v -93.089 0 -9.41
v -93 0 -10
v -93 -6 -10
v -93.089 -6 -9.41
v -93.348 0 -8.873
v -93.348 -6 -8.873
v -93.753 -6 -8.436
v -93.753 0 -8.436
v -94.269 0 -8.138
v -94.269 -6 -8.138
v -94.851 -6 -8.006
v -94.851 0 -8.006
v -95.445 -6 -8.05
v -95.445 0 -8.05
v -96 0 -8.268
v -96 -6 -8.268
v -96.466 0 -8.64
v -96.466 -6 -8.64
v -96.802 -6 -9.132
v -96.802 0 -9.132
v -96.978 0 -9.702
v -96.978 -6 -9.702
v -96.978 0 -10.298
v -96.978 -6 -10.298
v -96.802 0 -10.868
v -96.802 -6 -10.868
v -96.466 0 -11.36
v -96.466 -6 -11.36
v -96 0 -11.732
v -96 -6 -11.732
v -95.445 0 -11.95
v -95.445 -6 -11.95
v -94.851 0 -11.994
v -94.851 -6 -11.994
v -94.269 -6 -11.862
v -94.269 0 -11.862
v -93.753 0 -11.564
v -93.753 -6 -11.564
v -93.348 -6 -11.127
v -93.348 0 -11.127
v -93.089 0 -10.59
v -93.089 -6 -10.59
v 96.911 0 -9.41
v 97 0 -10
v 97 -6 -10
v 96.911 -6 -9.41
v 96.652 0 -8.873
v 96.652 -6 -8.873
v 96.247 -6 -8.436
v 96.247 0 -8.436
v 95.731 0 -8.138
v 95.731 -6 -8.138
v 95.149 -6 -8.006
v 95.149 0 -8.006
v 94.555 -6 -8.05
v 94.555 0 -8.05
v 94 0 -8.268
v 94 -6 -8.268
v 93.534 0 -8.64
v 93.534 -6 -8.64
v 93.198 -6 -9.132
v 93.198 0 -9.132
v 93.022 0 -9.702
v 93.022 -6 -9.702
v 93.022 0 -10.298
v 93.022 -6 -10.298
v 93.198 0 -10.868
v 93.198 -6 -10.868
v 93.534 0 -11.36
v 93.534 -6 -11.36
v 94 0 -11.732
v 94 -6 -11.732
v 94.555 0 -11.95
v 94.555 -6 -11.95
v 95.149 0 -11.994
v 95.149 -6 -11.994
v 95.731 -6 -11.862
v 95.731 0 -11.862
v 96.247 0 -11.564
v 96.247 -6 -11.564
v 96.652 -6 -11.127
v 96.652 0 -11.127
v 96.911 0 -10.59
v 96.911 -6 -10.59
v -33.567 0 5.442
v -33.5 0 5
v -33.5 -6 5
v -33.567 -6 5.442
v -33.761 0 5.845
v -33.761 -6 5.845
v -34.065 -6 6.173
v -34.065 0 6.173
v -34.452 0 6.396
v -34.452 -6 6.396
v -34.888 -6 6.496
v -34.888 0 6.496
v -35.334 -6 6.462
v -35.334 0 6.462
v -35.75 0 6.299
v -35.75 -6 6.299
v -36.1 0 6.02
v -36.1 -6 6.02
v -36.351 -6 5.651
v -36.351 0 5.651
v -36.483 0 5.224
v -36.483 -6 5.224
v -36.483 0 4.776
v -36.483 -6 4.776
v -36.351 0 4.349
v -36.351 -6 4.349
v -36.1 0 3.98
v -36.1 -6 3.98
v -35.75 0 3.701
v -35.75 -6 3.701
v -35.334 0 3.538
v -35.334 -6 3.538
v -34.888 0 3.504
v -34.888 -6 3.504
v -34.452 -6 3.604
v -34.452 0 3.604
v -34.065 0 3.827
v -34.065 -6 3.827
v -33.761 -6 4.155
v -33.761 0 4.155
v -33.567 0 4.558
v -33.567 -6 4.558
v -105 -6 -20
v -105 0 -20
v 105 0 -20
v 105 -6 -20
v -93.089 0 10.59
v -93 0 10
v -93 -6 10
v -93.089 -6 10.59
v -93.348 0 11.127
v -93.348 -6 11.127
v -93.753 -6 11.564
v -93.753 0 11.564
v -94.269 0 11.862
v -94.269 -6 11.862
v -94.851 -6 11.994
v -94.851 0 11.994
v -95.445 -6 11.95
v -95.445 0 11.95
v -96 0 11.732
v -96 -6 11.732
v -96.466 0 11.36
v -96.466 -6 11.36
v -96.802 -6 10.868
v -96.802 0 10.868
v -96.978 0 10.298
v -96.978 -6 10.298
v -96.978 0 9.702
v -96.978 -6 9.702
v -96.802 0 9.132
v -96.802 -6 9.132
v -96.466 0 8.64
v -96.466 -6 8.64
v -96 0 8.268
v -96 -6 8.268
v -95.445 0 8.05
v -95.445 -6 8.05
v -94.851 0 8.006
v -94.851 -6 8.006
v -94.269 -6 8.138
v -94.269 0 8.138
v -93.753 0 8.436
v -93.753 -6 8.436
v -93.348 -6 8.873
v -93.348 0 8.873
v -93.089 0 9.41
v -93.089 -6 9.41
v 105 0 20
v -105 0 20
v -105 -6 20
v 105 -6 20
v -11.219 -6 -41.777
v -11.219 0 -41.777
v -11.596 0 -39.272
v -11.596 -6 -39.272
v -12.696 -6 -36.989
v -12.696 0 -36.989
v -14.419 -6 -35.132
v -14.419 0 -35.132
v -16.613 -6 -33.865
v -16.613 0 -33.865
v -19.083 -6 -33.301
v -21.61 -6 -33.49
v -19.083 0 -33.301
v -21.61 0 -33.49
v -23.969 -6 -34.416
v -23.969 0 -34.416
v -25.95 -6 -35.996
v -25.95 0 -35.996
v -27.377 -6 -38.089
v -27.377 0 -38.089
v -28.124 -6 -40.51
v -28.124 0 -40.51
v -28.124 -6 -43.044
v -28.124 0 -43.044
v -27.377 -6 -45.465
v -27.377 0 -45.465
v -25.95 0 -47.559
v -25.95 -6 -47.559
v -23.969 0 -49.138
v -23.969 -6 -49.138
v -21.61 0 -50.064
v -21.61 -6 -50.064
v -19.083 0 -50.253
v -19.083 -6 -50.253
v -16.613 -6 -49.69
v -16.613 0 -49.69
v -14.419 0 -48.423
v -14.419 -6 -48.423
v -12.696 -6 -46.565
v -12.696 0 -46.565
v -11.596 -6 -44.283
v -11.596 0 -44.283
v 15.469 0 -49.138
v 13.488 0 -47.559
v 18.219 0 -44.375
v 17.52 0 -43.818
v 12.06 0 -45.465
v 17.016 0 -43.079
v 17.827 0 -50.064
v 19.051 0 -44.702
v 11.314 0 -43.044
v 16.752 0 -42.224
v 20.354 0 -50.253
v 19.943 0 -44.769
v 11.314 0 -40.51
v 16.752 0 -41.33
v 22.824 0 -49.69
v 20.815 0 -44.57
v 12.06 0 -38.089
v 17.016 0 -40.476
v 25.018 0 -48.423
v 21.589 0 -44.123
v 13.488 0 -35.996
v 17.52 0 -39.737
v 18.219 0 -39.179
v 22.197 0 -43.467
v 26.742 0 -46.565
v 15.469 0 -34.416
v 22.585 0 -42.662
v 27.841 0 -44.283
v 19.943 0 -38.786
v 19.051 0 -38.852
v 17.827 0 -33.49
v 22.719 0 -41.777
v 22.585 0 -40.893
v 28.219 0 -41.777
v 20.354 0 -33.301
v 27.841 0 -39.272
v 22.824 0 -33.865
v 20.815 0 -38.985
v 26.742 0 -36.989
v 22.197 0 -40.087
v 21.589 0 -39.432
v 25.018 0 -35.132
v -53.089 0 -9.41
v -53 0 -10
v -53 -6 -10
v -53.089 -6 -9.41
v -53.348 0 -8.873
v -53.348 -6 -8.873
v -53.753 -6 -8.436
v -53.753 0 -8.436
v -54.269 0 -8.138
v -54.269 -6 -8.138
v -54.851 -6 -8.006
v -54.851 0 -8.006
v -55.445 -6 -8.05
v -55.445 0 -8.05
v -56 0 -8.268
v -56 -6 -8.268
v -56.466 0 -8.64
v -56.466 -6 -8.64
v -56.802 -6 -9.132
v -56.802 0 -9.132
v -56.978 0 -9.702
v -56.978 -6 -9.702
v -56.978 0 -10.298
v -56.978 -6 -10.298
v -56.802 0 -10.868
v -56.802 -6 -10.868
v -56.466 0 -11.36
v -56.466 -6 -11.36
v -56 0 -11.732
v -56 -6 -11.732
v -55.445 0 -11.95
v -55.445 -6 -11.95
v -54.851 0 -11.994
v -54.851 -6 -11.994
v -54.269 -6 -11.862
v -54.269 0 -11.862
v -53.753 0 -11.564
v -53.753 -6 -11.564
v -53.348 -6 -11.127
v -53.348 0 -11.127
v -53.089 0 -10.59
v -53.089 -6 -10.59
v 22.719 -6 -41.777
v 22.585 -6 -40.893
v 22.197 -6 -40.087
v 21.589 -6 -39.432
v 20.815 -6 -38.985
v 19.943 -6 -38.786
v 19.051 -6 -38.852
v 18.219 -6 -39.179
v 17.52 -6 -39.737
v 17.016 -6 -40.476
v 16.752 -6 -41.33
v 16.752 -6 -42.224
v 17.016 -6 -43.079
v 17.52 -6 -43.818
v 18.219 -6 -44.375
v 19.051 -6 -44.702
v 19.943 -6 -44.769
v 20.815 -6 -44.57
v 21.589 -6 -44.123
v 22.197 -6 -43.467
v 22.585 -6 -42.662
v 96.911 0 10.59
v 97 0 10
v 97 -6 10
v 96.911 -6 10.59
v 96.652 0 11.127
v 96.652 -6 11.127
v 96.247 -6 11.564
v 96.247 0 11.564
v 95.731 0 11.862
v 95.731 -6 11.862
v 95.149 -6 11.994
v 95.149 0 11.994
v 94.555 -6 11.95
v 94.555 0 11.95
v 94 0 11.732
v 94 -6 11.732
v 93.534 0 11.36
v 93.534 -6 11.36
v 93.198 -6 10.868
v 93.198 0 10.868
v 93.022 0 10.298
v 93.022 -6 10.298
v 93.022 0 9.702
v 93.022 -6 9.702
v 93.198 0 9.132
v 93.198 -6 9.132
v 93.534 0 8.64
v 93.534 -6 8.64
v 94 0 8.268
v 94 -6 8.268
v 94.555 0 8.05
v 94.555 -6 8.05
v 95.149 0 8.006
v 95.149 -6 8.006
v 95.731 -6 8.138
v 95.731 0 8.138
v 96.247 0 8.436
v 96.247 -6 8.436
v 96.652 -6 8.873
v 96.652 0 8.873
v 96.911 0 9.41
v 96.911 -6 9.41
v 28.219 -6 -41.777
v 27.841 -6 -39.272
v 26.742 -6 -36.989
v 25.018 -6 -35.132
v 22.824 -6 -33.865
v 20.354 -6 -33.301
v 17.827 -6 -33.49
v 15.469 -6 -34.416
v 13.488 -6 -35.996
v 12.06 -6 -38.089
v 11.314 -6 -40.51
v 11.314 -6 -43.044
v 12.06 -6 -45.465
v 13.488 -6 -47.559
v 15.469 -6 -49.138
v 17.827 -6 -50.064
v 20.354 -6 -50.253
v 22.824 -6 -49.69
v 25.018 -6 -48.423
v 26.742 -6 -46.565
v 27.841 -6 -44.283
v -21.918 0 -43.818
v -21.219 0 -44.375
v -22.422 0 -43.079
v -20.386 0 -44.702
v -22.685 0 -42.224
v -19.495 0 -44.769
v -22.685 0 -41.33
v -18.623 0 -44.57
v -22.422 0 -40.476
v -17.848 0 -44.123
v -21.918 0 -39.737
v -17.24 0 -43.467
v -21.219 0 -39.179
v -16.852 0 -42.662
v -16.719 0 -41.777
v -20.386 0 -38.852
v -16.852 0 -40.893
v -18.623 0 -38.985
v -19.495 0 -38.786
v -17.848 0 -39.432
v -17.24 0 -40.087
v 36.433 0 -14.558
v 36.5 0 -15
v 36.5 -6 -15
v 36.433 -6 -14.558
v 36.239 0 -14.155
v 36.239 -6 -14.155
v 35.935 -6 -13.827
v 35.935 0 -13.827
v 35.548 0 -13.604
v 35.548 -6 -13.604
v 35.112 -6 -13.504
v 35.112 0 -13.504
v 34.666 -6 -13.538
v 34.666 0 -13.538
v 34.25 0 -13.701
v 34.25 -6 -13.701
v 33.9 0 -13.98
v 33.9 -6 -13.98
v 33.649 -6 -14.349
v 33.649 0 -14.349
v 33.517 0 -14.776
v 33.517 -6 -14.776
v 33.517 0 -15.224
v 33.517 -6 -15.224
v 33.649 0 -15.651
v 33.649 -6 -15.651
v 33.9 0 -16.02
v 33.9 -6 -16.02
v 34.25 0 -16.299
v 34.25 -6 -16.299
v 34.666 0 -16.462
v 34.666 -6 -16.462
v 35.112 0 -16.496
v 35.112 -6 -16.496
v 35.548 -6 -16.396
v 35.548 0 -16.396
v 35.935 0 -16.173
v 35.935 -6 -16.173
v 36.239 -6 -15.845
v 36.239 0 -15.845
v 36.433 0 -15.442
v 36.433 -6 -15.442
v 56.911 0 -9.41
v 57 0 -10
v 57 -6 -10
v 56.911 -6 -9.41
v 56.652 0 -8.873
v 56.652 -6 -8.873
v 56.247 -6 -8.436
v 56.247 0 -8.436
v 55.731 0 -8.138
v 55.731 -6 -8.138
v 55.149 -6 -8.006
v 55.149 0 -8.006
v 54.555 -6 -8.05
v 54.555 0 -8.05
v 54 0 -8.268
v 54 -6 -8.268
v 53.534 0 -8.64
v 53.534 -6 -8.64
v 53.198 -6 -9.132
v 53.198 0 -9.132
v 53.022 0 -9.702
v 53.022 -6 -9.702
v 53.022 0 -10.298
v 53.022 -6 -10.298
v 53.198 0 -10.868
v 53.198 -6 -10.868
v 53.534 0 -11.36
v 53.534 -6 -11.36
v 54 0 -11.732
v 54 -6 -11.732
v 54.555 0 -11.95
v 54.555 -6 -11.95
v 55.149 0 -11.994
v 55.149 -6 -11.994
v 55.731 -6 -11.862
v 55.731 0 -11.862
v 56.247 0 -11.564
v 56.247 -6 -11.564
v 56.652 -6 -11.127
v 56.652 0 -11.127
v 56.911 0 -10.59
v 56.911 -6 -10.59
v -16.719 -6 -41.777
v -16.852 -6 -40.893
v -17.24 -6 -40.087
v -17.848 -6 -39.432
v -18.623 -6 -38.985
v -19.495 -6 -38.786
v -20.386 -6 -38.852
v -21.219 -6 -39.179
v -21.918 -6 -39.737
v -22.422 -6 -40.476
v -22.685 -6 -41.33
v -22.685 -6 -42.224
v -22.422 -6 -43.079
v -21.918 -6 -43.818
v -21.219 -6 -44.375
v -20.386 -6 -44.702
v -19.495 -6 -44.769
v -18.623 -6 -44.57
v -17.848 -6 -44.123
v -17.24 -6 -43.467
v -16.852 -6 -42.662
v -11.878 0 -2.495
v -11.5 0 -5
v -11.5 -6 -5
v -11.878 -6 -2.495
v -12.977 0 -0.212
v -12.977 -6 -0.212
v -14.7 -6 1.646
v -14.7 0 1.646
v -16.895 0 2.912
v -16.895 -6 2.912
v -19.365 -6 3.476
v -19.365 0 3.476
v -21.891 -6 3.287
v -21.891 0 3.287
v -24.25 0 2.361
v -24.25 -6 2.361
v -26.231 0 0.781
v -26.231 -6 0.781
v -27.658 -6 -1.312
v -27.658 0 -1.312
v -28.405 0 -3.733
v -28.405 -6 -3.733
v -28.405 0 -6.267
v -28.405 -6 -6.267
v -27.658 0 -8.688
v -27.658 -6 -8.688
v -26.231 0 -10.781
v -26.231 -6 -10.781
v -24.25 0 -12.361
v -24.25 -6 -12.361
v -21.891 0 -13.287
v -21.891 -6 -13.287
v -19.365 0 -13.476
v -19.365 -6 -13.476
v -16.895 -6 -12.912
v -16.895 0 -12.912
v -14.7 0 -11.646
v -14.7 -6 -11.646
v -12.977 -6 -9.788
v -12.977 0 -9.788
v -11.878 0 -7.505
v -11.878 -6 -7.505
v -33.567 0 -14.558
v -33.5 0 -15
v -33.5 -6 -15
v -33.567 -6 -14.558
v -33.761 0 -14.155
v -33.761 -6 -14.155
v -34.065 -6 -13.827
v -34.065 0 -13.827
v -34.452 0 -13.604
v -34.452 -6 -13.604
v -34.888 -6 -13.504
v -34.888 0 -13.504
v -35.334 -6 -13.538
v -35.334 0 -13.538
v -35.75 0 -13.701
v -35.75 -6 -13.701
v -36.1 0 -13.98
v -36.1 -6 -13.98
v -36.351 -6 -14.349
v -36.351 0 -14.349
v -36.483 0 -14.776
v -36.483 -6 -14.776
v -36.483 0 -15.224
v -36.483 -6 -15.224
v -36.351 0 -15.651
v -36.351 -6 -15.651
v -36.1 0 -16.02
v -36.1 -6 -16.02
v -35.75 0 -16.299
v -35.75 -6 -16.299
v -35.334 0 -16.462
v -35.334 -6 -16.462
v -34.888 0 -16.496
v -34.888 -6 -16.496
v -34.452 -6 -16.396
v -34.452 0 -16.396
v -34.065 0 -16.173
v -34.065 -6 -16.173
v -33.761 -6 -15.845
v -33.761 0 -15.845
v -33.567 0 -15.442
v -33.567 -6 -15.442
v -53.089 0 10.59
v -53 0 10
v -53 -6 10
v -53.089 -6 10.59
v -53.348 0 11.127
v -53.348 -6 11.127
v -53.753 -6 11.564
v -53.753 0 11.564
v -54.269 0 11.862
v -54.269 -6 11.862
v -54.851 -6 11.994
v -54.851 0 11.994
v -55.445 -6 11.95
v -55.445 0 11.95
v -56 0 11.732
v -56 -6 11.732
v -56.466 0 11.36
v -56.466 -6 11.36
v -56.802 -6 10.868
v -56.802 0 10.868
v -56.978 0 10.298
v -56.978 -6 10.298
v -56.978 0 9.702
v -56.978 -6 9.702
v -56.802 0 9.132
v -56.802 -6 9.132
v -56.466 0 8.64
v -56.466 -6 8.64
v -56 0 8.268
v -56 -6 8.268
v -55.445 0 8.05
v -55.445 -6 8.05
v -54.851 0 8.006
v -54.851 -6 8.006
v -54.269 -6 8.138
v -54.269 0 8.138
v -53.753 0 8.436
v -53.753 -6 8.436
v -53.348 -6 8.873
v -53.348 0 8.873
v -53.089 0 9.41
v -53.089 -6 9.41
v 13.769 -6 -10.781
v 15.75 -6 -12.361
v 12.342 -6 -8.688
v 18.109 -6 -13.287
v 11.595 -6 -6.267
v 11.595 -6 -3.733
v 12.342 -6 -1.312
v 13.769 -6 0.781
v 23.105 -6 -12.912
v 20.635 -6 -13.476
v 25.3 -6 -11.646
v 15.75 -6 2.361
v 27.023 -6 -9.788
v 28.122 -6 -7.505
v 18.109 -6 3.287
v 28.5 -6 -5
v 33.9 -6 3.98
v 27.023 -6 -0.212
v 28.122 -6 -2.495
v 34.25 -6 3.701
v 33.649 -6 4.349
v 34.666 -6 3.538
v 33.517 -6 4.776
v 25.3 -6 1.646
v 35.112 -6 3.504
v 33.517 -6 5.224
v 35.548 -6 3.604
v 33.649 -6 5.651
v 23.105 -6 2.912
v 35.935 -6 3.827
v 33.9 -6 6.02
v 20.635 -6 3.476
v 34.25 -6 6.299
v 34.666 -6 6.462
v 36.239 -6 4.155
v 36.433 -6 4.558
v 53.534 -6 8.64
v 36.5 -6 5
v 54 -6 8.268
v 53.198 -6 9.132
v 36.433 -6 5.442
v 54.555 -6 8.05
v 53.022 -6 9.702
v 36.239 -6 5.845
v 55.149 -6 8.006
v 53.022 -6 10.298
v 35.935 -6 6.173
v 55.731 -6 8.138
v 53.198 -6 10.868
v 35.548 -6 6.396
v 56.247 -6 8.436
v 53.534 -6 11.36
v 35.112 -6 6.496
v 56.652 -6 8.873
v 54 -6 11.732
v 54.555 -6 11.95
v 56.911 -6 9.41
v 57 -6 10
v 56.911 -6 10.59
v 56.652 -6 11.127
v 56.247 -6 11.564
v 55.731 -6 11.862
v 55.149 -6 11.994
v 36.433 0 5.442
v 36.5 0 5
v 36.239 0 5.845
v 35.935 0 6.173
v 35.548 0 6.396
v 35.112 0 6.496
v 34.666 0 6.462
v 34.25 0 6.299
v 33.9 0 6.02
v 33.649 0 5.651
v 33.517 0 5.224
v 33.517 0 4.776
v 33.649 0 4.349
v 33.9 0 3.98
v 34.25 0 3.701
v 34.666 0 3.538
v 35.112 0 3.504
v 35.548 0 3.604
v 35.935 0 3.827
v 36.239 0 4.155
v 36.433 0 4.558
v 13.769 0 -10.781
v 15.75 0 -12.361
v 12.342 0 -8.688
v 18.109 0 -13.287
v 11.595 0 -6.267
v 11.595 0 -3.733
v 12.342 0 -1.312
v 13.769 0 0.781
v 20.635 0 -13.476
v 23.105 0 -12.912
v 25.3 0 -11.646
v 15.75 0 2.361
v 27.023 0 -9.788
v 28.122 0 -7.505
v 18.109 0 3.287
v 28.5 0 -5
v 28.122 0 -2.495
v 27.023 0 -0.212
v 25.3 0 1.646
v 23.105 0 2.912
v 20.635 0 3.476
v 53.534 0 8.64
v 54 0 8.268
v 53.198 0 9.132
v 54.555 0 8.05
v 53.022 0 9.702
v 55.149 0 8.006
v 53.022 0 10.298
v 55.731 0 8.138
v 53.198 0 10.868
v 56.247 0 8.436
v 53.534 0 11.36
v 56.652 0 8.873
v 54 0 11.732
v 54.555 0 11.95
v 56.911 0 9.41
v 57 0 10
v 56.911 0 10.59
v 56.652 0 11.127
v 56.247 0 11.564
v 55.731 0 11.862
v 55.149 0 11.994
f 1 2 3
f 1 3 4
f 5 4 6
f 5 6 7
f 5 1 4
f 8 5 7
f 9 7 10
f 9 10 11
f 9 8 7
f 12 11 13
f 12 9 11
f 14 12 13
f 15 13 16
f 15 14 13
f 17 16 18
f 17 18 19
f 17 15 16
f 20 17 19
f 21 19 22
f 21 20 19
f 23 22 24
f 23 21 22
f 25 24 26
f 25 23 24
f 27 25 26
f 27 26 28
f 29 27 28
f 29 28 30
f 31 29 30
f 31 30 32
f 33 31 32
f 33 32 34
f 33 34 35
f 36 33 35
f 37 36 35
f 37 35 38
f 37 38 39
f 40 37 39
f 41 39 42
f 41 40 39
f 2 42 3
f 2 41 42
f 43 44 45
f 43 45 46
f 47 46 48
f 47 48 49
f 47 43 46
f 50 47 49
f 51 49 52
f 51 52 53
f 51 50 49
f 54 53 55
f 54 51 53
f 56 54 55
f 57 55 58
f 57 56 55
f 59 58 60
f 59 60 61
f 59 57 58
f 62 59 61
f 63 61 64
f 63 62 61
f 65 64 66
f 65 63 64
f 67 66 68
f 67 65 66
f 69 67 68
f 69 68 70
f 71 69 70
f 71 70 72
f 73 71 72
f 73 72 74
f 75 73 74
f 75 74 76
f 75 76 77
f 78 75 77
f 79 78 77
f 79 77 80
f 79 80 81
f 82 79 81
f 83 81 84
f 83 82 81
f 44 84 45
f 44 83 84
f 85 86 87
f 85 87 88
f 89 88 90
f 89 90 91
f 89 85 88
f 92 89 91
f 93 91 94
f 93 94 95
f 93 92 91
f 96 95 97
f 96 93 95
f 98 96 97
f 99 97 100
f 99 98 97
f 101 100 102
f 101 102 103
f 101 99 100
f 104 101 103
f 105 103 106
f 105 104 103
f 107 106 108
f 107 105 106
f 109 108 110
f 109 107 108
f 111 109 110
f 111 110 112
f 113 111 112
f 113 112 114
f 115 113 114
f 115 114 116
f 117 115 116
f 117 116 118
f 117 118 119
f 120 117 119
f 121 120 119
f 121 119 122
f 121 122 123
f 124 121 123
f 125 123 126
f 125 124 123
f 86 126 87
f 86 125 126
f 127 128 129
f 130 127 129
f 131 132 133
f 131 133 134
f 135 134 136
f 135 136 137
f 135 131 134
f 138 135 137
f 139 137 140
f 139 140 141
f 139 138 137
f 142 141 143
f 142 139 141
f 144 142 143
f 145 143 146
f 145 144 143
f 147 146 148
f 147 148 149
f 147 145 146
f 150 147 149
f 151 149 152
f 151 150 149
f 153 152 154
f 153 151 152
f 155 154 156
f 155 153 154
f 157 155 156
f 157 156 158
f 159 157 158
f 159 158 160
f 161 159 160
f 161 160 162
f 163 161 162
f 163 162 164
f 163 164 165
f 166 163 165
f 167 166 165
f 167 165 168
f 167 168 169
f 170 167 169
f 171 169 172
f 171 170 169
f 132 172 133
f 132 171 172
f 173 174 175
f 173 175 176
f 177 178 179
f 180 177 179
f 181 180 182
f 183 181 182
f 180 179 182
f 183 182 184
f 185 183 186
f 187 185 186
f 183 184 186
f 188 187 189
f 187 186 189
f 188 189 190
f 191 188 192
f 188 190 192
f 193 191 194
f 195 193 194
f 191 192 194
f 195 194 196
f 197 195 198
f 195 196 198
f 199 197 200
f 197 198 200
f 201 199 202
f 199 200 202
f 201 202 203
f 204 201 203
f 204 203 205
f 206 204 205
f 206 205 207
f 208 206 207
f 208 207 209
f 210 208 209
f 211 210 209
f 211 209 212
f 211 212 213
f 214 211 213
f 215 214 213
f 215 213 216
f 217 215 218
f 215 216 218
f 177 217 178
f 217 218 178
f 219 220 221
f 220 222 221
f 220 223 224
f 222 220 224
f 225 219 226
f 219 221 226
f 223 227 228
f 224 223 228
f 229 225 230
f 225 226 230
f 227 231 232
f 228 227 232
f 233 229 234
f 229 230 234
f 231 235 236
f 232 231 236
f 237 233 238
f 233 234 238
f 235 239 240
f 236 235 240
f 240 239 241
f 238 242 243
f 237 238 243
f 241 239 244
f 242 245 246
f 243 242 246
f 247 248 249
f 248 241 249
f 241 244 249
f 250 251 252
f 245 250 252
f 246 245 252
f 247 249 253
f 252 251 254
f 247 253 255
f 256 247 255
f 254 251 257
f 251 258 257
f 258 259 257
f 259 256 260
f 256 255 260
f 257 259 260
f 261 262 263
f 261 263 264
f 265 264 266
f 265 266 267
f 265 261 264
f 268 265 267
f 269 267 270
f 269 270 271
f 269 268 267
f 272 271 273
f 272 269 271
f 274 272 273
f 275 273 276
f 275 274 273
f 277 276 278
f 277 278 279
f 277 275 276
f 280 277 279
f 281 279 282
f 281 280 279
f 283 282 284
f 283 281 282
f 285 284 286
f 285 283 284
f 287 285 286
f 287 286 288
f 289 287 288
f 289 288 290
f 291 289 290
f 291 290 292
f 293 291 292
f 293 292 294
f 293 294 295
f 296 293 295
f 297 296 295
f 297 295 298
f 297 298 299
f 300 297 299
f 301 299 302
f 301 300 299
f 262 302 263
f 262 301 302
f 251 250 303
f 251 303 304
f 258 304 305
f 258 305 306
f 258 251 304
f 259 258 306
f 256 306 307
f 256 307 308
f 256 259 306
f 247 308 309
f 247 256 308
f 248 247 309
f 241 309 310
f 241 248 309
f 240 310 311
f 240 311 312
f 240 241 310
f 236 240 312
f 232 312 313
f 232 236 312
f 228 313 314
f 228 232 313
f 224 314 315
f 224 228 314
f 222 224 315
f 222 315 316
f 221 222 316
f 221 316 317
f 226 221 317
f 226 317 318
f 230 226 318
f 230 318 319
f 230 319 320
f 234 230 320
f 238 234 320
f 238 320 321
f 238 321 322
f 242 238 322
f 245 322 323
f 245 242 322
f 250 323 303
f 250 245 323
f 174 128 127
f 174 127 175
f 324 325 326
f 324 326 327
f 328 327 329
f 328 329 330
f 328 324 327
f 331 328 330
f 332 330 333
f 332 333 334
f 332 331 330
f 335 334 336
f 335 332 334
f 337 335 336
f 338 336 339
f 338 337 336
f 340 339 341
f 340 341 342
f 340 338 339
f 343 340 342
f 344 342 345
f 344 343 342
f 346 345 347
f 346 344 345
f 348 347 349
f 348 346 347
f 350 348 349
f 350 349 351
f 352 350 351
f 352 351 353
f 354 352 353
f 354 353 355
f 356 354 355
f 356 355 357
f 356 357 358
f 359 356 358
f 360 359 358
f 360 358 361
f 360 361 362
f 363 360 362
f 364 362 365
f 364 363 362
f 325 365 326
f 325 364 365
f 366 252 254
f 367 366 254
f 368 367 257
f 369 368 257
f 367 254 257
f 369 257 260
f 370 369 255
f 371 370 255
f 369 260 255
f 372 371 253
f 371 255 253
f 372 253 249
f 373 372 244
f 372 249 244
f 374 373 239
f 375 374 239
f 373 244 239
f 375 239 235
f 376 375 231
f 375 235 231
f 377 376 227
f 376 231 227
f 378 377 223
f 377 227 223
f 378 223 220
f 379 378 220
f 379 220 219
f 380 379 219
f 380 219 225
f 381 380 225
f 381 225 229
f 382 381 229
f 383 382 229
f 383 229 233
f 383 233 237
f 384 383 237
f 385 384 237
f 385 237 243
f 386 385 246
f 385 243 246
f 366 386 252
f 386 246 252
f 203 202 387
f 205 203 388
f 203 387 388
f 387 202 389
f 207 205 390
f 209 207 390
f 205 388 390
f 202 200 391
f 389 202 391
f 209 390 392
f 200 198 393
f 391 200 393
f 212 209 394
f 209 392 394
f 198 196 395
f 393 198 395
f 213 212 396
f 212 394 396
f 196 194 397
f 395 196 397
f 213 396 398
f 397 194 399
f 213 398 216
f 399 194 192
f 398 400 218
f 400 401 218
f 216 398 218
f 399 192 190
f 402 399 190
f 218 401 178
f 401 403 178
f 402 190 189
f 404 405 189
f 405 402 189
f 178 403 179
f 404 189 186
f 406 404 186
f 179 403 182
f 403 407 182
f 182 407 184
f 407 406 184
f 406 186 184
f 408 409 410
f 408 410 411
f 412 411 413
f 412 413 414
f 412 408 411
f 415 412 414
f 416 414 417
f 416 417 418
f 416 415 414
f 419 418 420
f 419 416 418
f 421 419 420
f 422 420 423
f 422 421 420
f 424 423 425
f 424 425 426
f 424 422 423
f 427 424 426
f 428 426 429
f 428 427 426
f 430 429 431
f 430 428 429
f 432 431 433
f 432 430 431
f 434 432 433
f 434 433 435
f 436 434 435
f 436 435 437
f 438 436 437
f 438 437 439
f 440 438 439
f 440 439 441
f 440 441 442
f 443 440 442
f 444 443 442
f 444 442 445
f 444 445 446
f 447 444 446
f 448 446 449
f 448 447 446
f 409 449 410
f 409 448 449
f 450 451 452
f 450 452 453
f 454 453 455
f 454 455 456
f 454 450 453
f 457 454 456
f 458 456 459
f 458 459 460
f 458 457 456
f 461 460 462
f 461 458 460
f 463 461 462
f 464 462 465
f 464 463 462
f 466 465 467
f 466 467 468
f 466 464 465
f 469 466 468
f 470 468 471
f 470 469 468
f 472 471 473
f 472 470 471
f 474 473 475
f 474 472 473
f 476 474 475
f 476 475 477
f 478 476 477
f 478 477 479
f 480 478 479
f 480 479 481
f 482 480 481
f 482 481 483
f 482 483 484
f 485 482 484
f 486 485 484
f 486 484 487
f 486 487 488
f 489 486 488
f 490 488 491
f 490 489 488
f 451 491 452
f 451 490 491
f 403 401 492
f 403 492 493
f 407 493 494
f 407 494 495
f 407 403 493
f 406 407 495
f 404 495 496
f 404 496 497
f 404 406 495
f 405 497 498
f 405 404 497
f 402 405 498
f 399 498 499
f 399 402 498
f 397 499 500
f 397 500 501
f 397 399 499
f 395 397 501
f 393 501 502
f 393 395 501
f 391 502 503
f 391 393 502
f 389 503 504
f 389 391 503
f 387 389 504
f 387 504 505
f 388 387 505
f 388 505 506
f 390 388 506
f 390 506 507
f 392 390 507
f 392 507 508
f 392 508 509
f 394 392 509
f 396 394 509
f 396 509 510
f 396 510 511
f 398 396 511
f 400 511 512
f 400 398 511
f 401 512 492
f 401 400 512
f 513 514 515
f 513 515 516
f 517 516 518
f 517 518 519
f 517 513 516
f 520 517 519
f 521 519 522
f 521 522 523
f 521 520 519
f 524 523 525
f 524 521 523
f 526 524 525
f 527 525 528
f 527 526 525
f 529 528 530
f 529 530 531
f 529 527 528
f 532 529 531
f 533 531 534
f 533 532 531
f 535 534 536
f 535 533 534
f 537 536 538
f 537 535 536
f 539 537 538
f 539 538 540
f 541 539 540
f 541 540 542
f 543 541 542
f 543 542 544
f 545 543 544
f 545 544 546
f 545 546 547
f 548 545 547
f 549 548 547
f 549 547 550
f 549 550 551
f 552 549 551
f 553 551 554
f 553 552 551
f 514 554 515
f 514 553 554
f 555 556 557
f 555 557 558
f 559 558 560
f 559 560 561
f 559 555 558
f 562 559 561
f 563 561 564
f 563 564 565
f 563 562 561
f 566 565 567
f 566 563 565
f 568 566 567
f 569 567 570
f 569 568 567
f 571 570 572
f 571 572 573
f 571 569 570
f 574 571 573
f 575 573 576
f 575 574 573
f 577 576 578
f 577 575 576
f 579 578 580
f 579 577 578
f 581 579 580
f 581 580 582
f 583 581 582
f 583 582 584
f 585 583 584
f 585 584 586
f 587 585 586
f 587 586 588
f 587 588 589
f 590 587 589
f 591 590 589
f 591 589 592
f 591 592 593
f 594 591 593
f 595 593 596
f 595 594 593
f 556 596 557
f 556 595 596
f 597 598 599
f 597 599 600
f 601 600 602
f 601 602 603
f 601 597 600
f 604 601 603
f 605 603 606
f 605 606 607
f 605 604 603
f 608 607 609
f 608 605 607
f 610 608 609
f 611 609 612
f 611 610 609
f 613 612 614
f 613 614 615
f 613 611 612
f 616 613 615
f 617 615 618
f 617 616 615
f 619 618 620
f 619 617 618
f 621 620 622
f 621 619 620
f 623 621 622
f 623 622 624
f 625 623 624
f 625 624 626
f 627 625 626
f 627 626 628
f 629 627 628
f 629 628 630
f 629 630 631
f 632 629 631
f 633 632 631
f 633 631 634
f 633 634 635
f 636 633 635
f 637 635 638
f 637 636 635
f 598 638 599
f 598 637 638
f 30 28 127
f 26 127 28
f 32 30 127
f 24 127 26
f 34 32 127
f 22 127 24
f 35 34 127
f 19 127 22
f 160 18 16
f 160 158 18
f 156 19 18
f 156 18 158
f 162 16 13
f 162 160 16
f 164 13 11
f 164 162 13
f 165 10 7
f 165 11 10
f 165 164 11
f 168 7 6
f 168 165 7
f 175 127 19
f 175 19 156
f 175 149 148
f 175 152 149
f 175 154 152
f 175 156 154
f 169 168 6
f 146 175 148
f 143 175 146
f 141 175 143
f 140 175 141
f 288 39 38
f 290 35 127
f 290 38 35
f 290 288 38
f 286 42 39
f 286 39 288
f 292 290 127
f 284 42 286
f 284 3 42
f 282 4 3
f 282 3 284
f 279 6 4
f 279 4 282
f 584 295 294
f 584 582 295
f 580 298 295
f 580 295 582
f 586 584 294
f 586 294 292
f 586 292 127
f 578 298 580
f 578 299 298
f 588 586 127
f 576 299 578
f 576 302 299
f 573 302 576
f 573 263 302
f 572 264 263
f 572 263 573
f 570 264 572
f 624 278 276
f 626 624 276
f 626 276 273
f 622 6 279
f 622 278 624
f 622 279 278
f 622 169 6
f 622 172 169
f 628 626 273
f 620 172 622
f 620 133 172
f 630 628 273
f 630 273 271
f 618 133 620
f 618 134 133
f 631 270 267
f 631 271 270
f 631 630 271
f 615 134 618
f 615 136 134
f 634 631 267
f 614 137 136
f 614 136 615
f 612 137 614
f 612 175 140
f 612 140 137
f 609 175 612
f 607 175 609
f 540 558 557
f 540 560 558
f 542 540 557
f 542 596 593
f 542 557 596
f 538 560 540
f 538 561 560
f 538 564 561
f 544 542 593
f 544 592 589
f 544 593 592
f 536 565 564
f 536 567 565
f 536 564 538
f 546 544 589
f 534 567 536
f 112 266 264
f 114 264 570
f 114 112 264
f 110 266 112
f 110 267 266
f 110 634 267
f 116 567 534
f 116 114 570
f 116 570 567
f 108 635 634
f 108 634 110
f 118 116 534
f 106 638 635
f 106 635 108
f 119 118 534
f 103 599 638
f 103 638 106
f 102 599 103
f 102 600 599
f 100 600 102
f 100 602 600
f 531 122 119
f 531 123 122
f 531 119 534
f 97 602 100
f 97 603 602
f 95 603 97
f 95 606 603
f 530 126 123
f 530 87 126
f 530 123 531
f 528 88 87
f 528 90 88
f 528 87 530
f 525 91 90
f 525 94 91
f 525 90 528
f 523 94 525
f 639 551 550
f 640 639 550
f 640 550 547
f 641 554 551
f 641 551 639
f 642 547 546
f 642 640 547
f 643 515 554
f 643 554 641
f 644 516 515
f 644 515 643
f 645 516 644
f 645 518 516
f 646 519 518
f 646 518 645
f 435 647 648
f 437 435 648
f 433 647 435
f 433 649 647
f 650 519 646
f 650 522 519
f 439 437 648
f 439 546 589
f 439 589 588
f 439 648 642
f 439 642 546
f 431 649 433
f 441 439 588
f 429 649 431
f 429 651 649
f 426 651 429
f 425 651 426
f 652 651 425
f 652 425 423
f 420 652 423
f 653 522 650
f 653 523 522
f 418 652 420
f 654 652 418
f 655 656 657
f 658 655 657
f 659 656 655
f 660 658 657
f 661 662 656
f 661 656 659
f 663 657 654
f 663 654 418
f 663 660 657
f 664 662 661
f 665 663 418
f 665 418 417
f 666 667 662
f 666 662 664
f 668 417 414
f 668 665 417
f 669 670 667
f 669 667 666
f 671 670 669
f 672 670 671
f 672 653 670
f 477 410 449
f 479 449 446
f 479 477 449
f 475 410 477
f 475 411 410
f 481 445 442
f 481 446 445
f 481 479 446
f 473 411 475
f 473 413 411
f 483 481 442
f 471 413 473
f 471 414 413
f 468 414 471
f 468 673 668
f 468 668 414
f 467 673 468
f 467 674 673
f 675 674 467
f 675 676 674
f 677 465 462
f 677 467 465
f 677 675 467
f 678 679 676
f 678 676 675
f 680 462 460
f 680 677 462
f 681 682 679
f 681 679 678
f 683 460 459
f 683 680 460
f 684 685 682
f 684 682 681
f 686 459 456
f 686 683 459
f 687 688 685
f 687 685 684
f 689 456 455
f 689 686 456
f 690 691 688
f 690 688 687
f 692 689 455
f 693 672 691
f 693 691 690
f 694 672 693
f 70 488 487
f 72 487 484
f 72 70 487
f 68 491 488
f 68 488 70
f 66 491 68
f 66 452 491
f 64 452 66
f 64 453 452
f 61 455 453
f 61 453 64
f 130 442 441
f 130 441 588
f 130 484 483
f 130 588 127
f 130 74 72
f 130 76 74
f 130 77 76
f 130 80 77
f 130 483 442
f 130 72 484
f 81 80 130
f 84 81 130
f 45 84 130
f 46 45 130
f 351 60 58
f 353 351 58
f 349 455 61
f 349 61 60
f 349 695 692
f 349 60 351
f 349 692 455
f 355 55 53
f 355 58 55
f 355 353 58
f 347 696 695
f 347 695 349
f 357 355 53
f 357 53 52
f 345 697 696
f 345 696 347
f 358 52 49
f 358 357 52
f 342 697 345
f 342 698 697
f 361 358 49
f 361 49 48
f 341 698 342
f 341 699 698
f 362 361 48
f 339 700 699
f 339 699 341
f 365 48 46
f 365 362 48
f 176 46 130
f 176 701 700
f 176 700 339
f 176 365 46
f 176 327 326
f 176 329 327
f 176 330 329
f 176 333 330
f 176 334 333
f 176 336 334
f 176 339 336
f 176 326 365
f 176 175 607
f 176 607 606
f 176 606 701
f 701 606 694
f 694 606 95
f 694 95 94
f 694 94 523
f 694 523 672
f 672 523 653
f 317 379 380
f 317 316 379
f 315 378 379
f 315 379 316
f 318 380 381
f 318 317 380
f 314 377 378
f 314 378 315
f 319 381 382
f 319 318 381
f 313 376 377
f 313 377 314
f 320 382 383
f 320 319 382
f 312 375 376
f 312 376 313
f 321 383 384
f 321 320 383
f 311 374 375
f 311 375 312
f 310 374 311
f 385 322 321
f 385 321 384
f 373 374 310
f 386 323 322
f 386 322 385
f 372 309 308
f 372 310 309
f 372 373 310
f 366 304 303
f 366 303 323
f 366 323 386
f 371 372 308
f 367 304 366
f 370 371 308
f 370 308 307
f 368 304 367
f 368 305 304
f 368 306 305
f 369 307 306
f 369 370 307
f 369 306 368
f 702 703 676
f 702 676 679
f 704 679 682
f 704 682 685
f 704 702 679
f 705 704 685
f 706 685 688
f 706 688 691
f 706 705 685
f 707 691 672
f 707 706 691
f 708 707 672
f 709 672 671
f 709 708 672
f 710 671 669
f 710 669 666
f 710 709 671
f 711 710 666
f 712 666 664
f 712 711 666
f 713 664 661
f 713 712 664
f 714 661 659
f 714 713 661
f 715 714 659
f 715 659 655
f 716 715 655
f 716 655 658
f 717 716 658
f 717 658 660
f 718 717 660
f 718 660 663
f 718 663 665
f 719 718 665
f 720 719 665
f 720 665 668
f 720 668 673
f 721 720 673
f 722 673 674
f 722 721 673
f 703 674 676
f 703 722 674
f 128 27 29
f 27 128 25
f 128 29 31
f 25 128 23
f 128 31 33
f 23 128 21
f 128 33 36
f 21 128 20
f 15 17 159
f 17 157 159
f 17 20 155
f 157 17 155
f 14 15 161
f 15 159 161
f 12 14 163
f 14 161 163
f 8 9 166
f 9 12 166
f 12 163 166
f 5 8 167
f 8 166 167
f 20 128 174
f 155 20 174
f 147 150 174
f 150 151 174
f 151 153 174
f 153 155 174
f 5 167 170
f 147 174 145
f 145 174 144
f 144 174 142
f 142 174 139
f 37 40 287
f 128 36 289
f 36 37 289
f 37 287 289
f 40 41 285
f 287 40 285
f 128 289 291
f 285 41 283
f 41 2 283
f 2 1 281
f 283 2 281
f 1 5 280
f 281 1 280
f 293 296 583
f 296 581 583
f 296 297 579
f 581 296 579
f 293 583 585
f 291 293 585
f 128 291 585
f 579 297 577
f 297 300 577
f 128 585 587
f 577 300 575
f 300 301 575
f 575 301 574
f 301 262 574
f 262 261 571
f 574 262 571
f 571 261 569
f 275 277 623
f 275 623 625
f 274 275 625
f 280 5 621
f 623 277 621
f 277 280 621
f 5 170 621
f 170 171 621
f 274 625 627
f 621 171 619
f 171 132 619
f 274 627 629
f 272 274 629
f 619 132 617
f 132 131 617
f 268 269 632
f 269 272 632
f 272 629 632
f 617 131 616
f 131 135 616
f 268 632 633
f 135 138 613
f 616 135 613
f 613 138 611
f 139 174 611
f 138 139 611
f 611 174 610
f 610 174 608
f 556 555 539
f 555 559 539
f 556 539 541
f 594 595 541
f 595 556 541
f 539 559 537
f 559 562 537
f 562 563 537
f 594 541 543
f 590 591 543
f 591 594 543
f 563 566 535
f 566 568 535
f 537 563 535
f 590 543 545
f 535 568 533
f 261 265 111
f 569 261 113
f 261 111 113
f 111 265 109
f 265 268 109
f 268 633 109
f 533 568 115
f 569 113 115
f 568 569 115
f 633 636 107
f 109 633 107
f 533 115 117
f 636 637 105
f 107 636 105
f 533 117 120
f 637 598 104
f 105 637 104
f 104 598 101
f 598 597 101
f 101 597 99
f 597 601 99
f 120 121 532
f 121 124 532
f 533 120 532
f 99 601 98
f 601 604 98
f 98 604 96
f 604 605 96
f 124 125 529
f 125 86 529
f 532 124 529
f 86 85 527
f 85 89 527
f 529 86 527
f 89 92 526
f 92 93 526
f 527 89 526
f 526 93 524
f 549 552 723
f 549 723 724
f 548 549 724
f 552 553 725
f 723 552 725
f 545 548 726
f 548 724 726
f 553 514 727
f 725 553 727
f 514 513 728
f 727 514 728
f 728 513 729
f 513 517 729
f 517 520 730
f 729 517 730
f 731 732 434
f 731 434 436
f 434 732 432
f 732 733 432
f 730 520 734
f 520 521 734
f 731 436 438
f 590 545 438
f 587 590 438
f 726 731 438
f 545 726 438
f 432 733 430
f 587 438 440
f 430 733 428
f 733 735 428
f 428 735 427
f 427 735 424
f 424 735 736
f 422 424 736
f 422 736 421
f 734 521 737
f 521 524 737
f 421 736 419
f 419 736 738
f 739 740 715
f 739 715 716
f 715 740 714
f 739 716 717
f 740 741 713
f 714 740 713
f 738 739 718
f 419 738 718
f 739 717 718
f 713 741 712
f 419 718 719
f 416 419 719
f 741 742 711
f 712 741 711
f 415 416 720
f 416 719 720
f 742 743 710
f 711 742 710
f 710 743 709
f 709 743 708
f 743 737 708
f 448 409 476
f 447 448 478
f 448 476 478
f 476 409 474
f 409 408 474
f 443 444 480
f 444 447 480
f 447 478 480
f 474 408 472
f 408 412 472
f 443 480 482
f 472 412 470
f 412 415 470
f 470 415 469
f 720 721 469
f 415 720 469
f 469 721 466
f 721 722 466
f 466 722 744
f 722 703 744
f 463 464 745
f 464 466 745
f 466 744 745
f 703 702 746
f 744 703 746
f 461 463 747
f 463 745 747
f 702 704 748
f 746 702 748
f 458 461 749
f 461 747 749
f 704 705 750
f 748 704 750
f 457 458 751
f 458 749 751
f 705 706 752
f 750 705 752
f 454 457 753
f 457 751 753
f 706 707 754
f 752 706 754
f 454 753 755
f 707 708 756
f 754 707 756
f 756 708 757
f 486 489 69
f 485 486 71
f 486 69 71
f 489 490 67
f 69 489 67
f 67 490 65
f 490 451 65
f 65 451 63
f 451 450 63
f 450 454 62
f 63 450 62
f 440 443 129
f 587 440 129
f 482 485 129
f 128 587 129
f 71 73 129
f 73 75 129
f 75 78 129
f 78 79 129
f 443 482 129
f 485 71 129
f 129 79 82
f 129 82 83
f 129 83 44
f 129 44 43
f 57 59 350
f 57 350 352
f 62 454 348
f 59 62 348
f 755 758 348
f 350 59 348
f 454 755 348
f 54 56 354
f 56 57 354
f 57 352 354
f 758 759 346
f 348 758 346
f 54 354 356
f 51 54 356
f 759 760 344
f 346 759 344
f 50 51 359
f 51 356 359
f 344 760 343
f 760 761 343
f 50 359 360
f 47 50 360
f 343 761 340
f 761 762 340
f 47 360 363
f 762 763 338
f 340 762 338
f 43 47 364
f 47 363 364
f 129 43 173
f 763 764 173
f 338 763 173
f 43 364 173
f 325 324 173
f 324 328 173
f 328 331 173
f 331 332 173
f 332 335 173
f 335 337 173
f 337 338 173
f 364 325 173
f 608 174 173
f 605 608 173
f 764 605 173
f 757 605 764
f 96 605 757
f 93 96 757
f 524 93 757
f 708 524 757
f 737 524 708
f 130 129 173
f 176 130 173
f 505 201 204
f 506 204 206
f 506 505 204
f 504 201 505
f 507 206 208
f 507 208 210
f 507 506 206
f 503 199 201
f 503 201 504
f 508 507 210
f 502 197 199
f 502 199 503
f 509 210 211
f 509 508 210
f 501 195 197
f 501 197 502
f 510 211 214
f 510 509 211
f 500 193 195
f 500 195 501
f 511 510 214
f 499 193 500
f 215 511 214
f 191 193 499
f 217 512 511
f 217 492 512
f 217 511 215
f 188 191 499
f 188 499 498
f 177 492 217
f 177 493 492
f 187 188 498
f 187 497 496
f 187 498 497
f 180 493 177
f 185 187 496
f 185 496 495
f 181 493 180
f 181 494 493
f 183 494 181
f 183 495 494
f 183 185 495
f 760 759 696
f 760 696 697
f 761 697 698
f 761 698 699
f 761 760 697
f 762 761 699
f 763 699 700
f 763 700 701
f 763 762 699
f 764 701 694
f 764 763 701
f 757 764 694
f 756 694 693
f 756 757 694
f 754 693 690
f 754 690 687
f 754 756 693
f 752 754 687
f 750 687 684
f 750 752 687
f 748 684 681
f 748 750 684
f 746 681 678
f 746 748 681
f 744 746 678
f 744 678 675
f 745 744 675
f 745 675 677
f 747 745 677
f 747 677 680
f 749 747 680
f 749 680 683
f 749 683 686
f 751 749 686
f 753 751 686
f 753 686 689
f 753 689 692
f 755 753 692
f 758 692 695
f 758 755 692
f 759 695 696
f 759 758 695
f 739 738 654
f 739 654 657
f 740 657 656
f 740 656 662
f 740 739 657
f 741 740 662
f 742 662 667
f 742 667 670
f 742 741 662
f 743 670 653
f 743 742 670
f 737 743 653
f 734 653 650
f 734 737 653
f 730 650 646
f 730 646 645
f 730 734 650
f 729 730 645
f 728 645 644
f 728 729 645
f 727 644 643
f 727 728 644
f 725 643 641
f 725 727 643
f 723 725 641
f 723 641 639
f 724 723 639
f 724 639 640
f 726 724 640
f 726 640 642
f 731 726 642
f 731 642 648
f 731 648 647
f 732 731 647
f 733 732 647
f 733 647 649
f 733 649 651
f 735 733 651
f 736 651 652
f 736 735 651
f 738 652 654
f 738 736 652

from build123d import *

# Parameters (mm, degrees)
F0_W     = 210
F0_H     = 40
F0_R     = 1.5
F0_R_2   = 2
F0_R_3   = 8.5
F1_DEPTH = 6
F2_R     = 8.5
F2_R_2   = 3
F3_DEPTH = 6


with BuildPart() as f1:
    # F0 (on Front) → F1 (new body)
    with BuildSketch(Plane.XZ):
        Rectangle(F0_W, F0_H)
        with Locations((-35, -15)):
            Circle(F0_R, mode=Mode.SUBTRACT)
        with Locations((-95, -10)):
            Circle(F0_R_2, mode=Mode.SUBTRACT)
        with Locations((-55, -10)):
            Circle(F0_R_2, mode=Mode.SUBTRACT)
        with Locations((-20, -5)):
            Circle(F0_R_3, mode=Mode.SUBTRACT)
        with Locations((35, -15)):
            Circle(F0_R, mode=Mode.SUBTRACT)
        with Locations((20, -5)):
            Circle(F0_R_3, mode=Mode.SUBTRACT)
        with Locations((55, -10)):
            Circle(F0_R_2, mode=Mode.SUBTRACT)
        with Locations((95, -10)):
            Circle(F0_R_2, mode=Mode.SUBTRACT)
        with Locations((-35, 5)):
            Circle(F0_R, mode=Mode.SUBTRACT)
        with Locations((-95, 10)):
            Circle(F0_R_2, mode=Mode.SUBTRACT)
        with Locations((-55, 10)):
            Circle(F0_R_2, mode=Mode.SUBTRACT)
        with Locations((35, 5)):
            Circle(F0_R, mode=Mode.SUBTRACT)
        with Locations((55, 10)):
            Circle(F0_R_2, mode=Mode.SUBTRACT)
        with Locations((95, 10)):
            Circle(F0_R_2, mode=Mode.SUBTRACT)
    extrude(amount=F1_DEPTH)


with BuildPart() as f3:
    # F2 (on Front) → F3 (new body)
    with BuildSketch(Plane.XZ):
        with Locations((-19.718695, -41.777257)):
            Circle(F2_R)
        with Locations((-19.718695, -41.777257)):
            Circle(F2_R_2, mode=Mode.SUBTRACT)
        with Locations((19.718695, -41.777257)):
            Circle(F2_R)
        with Locations((19.718695, -41.777257)):
            Circle(F2_R_2, mode=Mode.SUBTRACT)
    extrude(amount=F3_DEPTH)


solid = Compound([f1.part, f3.part])
